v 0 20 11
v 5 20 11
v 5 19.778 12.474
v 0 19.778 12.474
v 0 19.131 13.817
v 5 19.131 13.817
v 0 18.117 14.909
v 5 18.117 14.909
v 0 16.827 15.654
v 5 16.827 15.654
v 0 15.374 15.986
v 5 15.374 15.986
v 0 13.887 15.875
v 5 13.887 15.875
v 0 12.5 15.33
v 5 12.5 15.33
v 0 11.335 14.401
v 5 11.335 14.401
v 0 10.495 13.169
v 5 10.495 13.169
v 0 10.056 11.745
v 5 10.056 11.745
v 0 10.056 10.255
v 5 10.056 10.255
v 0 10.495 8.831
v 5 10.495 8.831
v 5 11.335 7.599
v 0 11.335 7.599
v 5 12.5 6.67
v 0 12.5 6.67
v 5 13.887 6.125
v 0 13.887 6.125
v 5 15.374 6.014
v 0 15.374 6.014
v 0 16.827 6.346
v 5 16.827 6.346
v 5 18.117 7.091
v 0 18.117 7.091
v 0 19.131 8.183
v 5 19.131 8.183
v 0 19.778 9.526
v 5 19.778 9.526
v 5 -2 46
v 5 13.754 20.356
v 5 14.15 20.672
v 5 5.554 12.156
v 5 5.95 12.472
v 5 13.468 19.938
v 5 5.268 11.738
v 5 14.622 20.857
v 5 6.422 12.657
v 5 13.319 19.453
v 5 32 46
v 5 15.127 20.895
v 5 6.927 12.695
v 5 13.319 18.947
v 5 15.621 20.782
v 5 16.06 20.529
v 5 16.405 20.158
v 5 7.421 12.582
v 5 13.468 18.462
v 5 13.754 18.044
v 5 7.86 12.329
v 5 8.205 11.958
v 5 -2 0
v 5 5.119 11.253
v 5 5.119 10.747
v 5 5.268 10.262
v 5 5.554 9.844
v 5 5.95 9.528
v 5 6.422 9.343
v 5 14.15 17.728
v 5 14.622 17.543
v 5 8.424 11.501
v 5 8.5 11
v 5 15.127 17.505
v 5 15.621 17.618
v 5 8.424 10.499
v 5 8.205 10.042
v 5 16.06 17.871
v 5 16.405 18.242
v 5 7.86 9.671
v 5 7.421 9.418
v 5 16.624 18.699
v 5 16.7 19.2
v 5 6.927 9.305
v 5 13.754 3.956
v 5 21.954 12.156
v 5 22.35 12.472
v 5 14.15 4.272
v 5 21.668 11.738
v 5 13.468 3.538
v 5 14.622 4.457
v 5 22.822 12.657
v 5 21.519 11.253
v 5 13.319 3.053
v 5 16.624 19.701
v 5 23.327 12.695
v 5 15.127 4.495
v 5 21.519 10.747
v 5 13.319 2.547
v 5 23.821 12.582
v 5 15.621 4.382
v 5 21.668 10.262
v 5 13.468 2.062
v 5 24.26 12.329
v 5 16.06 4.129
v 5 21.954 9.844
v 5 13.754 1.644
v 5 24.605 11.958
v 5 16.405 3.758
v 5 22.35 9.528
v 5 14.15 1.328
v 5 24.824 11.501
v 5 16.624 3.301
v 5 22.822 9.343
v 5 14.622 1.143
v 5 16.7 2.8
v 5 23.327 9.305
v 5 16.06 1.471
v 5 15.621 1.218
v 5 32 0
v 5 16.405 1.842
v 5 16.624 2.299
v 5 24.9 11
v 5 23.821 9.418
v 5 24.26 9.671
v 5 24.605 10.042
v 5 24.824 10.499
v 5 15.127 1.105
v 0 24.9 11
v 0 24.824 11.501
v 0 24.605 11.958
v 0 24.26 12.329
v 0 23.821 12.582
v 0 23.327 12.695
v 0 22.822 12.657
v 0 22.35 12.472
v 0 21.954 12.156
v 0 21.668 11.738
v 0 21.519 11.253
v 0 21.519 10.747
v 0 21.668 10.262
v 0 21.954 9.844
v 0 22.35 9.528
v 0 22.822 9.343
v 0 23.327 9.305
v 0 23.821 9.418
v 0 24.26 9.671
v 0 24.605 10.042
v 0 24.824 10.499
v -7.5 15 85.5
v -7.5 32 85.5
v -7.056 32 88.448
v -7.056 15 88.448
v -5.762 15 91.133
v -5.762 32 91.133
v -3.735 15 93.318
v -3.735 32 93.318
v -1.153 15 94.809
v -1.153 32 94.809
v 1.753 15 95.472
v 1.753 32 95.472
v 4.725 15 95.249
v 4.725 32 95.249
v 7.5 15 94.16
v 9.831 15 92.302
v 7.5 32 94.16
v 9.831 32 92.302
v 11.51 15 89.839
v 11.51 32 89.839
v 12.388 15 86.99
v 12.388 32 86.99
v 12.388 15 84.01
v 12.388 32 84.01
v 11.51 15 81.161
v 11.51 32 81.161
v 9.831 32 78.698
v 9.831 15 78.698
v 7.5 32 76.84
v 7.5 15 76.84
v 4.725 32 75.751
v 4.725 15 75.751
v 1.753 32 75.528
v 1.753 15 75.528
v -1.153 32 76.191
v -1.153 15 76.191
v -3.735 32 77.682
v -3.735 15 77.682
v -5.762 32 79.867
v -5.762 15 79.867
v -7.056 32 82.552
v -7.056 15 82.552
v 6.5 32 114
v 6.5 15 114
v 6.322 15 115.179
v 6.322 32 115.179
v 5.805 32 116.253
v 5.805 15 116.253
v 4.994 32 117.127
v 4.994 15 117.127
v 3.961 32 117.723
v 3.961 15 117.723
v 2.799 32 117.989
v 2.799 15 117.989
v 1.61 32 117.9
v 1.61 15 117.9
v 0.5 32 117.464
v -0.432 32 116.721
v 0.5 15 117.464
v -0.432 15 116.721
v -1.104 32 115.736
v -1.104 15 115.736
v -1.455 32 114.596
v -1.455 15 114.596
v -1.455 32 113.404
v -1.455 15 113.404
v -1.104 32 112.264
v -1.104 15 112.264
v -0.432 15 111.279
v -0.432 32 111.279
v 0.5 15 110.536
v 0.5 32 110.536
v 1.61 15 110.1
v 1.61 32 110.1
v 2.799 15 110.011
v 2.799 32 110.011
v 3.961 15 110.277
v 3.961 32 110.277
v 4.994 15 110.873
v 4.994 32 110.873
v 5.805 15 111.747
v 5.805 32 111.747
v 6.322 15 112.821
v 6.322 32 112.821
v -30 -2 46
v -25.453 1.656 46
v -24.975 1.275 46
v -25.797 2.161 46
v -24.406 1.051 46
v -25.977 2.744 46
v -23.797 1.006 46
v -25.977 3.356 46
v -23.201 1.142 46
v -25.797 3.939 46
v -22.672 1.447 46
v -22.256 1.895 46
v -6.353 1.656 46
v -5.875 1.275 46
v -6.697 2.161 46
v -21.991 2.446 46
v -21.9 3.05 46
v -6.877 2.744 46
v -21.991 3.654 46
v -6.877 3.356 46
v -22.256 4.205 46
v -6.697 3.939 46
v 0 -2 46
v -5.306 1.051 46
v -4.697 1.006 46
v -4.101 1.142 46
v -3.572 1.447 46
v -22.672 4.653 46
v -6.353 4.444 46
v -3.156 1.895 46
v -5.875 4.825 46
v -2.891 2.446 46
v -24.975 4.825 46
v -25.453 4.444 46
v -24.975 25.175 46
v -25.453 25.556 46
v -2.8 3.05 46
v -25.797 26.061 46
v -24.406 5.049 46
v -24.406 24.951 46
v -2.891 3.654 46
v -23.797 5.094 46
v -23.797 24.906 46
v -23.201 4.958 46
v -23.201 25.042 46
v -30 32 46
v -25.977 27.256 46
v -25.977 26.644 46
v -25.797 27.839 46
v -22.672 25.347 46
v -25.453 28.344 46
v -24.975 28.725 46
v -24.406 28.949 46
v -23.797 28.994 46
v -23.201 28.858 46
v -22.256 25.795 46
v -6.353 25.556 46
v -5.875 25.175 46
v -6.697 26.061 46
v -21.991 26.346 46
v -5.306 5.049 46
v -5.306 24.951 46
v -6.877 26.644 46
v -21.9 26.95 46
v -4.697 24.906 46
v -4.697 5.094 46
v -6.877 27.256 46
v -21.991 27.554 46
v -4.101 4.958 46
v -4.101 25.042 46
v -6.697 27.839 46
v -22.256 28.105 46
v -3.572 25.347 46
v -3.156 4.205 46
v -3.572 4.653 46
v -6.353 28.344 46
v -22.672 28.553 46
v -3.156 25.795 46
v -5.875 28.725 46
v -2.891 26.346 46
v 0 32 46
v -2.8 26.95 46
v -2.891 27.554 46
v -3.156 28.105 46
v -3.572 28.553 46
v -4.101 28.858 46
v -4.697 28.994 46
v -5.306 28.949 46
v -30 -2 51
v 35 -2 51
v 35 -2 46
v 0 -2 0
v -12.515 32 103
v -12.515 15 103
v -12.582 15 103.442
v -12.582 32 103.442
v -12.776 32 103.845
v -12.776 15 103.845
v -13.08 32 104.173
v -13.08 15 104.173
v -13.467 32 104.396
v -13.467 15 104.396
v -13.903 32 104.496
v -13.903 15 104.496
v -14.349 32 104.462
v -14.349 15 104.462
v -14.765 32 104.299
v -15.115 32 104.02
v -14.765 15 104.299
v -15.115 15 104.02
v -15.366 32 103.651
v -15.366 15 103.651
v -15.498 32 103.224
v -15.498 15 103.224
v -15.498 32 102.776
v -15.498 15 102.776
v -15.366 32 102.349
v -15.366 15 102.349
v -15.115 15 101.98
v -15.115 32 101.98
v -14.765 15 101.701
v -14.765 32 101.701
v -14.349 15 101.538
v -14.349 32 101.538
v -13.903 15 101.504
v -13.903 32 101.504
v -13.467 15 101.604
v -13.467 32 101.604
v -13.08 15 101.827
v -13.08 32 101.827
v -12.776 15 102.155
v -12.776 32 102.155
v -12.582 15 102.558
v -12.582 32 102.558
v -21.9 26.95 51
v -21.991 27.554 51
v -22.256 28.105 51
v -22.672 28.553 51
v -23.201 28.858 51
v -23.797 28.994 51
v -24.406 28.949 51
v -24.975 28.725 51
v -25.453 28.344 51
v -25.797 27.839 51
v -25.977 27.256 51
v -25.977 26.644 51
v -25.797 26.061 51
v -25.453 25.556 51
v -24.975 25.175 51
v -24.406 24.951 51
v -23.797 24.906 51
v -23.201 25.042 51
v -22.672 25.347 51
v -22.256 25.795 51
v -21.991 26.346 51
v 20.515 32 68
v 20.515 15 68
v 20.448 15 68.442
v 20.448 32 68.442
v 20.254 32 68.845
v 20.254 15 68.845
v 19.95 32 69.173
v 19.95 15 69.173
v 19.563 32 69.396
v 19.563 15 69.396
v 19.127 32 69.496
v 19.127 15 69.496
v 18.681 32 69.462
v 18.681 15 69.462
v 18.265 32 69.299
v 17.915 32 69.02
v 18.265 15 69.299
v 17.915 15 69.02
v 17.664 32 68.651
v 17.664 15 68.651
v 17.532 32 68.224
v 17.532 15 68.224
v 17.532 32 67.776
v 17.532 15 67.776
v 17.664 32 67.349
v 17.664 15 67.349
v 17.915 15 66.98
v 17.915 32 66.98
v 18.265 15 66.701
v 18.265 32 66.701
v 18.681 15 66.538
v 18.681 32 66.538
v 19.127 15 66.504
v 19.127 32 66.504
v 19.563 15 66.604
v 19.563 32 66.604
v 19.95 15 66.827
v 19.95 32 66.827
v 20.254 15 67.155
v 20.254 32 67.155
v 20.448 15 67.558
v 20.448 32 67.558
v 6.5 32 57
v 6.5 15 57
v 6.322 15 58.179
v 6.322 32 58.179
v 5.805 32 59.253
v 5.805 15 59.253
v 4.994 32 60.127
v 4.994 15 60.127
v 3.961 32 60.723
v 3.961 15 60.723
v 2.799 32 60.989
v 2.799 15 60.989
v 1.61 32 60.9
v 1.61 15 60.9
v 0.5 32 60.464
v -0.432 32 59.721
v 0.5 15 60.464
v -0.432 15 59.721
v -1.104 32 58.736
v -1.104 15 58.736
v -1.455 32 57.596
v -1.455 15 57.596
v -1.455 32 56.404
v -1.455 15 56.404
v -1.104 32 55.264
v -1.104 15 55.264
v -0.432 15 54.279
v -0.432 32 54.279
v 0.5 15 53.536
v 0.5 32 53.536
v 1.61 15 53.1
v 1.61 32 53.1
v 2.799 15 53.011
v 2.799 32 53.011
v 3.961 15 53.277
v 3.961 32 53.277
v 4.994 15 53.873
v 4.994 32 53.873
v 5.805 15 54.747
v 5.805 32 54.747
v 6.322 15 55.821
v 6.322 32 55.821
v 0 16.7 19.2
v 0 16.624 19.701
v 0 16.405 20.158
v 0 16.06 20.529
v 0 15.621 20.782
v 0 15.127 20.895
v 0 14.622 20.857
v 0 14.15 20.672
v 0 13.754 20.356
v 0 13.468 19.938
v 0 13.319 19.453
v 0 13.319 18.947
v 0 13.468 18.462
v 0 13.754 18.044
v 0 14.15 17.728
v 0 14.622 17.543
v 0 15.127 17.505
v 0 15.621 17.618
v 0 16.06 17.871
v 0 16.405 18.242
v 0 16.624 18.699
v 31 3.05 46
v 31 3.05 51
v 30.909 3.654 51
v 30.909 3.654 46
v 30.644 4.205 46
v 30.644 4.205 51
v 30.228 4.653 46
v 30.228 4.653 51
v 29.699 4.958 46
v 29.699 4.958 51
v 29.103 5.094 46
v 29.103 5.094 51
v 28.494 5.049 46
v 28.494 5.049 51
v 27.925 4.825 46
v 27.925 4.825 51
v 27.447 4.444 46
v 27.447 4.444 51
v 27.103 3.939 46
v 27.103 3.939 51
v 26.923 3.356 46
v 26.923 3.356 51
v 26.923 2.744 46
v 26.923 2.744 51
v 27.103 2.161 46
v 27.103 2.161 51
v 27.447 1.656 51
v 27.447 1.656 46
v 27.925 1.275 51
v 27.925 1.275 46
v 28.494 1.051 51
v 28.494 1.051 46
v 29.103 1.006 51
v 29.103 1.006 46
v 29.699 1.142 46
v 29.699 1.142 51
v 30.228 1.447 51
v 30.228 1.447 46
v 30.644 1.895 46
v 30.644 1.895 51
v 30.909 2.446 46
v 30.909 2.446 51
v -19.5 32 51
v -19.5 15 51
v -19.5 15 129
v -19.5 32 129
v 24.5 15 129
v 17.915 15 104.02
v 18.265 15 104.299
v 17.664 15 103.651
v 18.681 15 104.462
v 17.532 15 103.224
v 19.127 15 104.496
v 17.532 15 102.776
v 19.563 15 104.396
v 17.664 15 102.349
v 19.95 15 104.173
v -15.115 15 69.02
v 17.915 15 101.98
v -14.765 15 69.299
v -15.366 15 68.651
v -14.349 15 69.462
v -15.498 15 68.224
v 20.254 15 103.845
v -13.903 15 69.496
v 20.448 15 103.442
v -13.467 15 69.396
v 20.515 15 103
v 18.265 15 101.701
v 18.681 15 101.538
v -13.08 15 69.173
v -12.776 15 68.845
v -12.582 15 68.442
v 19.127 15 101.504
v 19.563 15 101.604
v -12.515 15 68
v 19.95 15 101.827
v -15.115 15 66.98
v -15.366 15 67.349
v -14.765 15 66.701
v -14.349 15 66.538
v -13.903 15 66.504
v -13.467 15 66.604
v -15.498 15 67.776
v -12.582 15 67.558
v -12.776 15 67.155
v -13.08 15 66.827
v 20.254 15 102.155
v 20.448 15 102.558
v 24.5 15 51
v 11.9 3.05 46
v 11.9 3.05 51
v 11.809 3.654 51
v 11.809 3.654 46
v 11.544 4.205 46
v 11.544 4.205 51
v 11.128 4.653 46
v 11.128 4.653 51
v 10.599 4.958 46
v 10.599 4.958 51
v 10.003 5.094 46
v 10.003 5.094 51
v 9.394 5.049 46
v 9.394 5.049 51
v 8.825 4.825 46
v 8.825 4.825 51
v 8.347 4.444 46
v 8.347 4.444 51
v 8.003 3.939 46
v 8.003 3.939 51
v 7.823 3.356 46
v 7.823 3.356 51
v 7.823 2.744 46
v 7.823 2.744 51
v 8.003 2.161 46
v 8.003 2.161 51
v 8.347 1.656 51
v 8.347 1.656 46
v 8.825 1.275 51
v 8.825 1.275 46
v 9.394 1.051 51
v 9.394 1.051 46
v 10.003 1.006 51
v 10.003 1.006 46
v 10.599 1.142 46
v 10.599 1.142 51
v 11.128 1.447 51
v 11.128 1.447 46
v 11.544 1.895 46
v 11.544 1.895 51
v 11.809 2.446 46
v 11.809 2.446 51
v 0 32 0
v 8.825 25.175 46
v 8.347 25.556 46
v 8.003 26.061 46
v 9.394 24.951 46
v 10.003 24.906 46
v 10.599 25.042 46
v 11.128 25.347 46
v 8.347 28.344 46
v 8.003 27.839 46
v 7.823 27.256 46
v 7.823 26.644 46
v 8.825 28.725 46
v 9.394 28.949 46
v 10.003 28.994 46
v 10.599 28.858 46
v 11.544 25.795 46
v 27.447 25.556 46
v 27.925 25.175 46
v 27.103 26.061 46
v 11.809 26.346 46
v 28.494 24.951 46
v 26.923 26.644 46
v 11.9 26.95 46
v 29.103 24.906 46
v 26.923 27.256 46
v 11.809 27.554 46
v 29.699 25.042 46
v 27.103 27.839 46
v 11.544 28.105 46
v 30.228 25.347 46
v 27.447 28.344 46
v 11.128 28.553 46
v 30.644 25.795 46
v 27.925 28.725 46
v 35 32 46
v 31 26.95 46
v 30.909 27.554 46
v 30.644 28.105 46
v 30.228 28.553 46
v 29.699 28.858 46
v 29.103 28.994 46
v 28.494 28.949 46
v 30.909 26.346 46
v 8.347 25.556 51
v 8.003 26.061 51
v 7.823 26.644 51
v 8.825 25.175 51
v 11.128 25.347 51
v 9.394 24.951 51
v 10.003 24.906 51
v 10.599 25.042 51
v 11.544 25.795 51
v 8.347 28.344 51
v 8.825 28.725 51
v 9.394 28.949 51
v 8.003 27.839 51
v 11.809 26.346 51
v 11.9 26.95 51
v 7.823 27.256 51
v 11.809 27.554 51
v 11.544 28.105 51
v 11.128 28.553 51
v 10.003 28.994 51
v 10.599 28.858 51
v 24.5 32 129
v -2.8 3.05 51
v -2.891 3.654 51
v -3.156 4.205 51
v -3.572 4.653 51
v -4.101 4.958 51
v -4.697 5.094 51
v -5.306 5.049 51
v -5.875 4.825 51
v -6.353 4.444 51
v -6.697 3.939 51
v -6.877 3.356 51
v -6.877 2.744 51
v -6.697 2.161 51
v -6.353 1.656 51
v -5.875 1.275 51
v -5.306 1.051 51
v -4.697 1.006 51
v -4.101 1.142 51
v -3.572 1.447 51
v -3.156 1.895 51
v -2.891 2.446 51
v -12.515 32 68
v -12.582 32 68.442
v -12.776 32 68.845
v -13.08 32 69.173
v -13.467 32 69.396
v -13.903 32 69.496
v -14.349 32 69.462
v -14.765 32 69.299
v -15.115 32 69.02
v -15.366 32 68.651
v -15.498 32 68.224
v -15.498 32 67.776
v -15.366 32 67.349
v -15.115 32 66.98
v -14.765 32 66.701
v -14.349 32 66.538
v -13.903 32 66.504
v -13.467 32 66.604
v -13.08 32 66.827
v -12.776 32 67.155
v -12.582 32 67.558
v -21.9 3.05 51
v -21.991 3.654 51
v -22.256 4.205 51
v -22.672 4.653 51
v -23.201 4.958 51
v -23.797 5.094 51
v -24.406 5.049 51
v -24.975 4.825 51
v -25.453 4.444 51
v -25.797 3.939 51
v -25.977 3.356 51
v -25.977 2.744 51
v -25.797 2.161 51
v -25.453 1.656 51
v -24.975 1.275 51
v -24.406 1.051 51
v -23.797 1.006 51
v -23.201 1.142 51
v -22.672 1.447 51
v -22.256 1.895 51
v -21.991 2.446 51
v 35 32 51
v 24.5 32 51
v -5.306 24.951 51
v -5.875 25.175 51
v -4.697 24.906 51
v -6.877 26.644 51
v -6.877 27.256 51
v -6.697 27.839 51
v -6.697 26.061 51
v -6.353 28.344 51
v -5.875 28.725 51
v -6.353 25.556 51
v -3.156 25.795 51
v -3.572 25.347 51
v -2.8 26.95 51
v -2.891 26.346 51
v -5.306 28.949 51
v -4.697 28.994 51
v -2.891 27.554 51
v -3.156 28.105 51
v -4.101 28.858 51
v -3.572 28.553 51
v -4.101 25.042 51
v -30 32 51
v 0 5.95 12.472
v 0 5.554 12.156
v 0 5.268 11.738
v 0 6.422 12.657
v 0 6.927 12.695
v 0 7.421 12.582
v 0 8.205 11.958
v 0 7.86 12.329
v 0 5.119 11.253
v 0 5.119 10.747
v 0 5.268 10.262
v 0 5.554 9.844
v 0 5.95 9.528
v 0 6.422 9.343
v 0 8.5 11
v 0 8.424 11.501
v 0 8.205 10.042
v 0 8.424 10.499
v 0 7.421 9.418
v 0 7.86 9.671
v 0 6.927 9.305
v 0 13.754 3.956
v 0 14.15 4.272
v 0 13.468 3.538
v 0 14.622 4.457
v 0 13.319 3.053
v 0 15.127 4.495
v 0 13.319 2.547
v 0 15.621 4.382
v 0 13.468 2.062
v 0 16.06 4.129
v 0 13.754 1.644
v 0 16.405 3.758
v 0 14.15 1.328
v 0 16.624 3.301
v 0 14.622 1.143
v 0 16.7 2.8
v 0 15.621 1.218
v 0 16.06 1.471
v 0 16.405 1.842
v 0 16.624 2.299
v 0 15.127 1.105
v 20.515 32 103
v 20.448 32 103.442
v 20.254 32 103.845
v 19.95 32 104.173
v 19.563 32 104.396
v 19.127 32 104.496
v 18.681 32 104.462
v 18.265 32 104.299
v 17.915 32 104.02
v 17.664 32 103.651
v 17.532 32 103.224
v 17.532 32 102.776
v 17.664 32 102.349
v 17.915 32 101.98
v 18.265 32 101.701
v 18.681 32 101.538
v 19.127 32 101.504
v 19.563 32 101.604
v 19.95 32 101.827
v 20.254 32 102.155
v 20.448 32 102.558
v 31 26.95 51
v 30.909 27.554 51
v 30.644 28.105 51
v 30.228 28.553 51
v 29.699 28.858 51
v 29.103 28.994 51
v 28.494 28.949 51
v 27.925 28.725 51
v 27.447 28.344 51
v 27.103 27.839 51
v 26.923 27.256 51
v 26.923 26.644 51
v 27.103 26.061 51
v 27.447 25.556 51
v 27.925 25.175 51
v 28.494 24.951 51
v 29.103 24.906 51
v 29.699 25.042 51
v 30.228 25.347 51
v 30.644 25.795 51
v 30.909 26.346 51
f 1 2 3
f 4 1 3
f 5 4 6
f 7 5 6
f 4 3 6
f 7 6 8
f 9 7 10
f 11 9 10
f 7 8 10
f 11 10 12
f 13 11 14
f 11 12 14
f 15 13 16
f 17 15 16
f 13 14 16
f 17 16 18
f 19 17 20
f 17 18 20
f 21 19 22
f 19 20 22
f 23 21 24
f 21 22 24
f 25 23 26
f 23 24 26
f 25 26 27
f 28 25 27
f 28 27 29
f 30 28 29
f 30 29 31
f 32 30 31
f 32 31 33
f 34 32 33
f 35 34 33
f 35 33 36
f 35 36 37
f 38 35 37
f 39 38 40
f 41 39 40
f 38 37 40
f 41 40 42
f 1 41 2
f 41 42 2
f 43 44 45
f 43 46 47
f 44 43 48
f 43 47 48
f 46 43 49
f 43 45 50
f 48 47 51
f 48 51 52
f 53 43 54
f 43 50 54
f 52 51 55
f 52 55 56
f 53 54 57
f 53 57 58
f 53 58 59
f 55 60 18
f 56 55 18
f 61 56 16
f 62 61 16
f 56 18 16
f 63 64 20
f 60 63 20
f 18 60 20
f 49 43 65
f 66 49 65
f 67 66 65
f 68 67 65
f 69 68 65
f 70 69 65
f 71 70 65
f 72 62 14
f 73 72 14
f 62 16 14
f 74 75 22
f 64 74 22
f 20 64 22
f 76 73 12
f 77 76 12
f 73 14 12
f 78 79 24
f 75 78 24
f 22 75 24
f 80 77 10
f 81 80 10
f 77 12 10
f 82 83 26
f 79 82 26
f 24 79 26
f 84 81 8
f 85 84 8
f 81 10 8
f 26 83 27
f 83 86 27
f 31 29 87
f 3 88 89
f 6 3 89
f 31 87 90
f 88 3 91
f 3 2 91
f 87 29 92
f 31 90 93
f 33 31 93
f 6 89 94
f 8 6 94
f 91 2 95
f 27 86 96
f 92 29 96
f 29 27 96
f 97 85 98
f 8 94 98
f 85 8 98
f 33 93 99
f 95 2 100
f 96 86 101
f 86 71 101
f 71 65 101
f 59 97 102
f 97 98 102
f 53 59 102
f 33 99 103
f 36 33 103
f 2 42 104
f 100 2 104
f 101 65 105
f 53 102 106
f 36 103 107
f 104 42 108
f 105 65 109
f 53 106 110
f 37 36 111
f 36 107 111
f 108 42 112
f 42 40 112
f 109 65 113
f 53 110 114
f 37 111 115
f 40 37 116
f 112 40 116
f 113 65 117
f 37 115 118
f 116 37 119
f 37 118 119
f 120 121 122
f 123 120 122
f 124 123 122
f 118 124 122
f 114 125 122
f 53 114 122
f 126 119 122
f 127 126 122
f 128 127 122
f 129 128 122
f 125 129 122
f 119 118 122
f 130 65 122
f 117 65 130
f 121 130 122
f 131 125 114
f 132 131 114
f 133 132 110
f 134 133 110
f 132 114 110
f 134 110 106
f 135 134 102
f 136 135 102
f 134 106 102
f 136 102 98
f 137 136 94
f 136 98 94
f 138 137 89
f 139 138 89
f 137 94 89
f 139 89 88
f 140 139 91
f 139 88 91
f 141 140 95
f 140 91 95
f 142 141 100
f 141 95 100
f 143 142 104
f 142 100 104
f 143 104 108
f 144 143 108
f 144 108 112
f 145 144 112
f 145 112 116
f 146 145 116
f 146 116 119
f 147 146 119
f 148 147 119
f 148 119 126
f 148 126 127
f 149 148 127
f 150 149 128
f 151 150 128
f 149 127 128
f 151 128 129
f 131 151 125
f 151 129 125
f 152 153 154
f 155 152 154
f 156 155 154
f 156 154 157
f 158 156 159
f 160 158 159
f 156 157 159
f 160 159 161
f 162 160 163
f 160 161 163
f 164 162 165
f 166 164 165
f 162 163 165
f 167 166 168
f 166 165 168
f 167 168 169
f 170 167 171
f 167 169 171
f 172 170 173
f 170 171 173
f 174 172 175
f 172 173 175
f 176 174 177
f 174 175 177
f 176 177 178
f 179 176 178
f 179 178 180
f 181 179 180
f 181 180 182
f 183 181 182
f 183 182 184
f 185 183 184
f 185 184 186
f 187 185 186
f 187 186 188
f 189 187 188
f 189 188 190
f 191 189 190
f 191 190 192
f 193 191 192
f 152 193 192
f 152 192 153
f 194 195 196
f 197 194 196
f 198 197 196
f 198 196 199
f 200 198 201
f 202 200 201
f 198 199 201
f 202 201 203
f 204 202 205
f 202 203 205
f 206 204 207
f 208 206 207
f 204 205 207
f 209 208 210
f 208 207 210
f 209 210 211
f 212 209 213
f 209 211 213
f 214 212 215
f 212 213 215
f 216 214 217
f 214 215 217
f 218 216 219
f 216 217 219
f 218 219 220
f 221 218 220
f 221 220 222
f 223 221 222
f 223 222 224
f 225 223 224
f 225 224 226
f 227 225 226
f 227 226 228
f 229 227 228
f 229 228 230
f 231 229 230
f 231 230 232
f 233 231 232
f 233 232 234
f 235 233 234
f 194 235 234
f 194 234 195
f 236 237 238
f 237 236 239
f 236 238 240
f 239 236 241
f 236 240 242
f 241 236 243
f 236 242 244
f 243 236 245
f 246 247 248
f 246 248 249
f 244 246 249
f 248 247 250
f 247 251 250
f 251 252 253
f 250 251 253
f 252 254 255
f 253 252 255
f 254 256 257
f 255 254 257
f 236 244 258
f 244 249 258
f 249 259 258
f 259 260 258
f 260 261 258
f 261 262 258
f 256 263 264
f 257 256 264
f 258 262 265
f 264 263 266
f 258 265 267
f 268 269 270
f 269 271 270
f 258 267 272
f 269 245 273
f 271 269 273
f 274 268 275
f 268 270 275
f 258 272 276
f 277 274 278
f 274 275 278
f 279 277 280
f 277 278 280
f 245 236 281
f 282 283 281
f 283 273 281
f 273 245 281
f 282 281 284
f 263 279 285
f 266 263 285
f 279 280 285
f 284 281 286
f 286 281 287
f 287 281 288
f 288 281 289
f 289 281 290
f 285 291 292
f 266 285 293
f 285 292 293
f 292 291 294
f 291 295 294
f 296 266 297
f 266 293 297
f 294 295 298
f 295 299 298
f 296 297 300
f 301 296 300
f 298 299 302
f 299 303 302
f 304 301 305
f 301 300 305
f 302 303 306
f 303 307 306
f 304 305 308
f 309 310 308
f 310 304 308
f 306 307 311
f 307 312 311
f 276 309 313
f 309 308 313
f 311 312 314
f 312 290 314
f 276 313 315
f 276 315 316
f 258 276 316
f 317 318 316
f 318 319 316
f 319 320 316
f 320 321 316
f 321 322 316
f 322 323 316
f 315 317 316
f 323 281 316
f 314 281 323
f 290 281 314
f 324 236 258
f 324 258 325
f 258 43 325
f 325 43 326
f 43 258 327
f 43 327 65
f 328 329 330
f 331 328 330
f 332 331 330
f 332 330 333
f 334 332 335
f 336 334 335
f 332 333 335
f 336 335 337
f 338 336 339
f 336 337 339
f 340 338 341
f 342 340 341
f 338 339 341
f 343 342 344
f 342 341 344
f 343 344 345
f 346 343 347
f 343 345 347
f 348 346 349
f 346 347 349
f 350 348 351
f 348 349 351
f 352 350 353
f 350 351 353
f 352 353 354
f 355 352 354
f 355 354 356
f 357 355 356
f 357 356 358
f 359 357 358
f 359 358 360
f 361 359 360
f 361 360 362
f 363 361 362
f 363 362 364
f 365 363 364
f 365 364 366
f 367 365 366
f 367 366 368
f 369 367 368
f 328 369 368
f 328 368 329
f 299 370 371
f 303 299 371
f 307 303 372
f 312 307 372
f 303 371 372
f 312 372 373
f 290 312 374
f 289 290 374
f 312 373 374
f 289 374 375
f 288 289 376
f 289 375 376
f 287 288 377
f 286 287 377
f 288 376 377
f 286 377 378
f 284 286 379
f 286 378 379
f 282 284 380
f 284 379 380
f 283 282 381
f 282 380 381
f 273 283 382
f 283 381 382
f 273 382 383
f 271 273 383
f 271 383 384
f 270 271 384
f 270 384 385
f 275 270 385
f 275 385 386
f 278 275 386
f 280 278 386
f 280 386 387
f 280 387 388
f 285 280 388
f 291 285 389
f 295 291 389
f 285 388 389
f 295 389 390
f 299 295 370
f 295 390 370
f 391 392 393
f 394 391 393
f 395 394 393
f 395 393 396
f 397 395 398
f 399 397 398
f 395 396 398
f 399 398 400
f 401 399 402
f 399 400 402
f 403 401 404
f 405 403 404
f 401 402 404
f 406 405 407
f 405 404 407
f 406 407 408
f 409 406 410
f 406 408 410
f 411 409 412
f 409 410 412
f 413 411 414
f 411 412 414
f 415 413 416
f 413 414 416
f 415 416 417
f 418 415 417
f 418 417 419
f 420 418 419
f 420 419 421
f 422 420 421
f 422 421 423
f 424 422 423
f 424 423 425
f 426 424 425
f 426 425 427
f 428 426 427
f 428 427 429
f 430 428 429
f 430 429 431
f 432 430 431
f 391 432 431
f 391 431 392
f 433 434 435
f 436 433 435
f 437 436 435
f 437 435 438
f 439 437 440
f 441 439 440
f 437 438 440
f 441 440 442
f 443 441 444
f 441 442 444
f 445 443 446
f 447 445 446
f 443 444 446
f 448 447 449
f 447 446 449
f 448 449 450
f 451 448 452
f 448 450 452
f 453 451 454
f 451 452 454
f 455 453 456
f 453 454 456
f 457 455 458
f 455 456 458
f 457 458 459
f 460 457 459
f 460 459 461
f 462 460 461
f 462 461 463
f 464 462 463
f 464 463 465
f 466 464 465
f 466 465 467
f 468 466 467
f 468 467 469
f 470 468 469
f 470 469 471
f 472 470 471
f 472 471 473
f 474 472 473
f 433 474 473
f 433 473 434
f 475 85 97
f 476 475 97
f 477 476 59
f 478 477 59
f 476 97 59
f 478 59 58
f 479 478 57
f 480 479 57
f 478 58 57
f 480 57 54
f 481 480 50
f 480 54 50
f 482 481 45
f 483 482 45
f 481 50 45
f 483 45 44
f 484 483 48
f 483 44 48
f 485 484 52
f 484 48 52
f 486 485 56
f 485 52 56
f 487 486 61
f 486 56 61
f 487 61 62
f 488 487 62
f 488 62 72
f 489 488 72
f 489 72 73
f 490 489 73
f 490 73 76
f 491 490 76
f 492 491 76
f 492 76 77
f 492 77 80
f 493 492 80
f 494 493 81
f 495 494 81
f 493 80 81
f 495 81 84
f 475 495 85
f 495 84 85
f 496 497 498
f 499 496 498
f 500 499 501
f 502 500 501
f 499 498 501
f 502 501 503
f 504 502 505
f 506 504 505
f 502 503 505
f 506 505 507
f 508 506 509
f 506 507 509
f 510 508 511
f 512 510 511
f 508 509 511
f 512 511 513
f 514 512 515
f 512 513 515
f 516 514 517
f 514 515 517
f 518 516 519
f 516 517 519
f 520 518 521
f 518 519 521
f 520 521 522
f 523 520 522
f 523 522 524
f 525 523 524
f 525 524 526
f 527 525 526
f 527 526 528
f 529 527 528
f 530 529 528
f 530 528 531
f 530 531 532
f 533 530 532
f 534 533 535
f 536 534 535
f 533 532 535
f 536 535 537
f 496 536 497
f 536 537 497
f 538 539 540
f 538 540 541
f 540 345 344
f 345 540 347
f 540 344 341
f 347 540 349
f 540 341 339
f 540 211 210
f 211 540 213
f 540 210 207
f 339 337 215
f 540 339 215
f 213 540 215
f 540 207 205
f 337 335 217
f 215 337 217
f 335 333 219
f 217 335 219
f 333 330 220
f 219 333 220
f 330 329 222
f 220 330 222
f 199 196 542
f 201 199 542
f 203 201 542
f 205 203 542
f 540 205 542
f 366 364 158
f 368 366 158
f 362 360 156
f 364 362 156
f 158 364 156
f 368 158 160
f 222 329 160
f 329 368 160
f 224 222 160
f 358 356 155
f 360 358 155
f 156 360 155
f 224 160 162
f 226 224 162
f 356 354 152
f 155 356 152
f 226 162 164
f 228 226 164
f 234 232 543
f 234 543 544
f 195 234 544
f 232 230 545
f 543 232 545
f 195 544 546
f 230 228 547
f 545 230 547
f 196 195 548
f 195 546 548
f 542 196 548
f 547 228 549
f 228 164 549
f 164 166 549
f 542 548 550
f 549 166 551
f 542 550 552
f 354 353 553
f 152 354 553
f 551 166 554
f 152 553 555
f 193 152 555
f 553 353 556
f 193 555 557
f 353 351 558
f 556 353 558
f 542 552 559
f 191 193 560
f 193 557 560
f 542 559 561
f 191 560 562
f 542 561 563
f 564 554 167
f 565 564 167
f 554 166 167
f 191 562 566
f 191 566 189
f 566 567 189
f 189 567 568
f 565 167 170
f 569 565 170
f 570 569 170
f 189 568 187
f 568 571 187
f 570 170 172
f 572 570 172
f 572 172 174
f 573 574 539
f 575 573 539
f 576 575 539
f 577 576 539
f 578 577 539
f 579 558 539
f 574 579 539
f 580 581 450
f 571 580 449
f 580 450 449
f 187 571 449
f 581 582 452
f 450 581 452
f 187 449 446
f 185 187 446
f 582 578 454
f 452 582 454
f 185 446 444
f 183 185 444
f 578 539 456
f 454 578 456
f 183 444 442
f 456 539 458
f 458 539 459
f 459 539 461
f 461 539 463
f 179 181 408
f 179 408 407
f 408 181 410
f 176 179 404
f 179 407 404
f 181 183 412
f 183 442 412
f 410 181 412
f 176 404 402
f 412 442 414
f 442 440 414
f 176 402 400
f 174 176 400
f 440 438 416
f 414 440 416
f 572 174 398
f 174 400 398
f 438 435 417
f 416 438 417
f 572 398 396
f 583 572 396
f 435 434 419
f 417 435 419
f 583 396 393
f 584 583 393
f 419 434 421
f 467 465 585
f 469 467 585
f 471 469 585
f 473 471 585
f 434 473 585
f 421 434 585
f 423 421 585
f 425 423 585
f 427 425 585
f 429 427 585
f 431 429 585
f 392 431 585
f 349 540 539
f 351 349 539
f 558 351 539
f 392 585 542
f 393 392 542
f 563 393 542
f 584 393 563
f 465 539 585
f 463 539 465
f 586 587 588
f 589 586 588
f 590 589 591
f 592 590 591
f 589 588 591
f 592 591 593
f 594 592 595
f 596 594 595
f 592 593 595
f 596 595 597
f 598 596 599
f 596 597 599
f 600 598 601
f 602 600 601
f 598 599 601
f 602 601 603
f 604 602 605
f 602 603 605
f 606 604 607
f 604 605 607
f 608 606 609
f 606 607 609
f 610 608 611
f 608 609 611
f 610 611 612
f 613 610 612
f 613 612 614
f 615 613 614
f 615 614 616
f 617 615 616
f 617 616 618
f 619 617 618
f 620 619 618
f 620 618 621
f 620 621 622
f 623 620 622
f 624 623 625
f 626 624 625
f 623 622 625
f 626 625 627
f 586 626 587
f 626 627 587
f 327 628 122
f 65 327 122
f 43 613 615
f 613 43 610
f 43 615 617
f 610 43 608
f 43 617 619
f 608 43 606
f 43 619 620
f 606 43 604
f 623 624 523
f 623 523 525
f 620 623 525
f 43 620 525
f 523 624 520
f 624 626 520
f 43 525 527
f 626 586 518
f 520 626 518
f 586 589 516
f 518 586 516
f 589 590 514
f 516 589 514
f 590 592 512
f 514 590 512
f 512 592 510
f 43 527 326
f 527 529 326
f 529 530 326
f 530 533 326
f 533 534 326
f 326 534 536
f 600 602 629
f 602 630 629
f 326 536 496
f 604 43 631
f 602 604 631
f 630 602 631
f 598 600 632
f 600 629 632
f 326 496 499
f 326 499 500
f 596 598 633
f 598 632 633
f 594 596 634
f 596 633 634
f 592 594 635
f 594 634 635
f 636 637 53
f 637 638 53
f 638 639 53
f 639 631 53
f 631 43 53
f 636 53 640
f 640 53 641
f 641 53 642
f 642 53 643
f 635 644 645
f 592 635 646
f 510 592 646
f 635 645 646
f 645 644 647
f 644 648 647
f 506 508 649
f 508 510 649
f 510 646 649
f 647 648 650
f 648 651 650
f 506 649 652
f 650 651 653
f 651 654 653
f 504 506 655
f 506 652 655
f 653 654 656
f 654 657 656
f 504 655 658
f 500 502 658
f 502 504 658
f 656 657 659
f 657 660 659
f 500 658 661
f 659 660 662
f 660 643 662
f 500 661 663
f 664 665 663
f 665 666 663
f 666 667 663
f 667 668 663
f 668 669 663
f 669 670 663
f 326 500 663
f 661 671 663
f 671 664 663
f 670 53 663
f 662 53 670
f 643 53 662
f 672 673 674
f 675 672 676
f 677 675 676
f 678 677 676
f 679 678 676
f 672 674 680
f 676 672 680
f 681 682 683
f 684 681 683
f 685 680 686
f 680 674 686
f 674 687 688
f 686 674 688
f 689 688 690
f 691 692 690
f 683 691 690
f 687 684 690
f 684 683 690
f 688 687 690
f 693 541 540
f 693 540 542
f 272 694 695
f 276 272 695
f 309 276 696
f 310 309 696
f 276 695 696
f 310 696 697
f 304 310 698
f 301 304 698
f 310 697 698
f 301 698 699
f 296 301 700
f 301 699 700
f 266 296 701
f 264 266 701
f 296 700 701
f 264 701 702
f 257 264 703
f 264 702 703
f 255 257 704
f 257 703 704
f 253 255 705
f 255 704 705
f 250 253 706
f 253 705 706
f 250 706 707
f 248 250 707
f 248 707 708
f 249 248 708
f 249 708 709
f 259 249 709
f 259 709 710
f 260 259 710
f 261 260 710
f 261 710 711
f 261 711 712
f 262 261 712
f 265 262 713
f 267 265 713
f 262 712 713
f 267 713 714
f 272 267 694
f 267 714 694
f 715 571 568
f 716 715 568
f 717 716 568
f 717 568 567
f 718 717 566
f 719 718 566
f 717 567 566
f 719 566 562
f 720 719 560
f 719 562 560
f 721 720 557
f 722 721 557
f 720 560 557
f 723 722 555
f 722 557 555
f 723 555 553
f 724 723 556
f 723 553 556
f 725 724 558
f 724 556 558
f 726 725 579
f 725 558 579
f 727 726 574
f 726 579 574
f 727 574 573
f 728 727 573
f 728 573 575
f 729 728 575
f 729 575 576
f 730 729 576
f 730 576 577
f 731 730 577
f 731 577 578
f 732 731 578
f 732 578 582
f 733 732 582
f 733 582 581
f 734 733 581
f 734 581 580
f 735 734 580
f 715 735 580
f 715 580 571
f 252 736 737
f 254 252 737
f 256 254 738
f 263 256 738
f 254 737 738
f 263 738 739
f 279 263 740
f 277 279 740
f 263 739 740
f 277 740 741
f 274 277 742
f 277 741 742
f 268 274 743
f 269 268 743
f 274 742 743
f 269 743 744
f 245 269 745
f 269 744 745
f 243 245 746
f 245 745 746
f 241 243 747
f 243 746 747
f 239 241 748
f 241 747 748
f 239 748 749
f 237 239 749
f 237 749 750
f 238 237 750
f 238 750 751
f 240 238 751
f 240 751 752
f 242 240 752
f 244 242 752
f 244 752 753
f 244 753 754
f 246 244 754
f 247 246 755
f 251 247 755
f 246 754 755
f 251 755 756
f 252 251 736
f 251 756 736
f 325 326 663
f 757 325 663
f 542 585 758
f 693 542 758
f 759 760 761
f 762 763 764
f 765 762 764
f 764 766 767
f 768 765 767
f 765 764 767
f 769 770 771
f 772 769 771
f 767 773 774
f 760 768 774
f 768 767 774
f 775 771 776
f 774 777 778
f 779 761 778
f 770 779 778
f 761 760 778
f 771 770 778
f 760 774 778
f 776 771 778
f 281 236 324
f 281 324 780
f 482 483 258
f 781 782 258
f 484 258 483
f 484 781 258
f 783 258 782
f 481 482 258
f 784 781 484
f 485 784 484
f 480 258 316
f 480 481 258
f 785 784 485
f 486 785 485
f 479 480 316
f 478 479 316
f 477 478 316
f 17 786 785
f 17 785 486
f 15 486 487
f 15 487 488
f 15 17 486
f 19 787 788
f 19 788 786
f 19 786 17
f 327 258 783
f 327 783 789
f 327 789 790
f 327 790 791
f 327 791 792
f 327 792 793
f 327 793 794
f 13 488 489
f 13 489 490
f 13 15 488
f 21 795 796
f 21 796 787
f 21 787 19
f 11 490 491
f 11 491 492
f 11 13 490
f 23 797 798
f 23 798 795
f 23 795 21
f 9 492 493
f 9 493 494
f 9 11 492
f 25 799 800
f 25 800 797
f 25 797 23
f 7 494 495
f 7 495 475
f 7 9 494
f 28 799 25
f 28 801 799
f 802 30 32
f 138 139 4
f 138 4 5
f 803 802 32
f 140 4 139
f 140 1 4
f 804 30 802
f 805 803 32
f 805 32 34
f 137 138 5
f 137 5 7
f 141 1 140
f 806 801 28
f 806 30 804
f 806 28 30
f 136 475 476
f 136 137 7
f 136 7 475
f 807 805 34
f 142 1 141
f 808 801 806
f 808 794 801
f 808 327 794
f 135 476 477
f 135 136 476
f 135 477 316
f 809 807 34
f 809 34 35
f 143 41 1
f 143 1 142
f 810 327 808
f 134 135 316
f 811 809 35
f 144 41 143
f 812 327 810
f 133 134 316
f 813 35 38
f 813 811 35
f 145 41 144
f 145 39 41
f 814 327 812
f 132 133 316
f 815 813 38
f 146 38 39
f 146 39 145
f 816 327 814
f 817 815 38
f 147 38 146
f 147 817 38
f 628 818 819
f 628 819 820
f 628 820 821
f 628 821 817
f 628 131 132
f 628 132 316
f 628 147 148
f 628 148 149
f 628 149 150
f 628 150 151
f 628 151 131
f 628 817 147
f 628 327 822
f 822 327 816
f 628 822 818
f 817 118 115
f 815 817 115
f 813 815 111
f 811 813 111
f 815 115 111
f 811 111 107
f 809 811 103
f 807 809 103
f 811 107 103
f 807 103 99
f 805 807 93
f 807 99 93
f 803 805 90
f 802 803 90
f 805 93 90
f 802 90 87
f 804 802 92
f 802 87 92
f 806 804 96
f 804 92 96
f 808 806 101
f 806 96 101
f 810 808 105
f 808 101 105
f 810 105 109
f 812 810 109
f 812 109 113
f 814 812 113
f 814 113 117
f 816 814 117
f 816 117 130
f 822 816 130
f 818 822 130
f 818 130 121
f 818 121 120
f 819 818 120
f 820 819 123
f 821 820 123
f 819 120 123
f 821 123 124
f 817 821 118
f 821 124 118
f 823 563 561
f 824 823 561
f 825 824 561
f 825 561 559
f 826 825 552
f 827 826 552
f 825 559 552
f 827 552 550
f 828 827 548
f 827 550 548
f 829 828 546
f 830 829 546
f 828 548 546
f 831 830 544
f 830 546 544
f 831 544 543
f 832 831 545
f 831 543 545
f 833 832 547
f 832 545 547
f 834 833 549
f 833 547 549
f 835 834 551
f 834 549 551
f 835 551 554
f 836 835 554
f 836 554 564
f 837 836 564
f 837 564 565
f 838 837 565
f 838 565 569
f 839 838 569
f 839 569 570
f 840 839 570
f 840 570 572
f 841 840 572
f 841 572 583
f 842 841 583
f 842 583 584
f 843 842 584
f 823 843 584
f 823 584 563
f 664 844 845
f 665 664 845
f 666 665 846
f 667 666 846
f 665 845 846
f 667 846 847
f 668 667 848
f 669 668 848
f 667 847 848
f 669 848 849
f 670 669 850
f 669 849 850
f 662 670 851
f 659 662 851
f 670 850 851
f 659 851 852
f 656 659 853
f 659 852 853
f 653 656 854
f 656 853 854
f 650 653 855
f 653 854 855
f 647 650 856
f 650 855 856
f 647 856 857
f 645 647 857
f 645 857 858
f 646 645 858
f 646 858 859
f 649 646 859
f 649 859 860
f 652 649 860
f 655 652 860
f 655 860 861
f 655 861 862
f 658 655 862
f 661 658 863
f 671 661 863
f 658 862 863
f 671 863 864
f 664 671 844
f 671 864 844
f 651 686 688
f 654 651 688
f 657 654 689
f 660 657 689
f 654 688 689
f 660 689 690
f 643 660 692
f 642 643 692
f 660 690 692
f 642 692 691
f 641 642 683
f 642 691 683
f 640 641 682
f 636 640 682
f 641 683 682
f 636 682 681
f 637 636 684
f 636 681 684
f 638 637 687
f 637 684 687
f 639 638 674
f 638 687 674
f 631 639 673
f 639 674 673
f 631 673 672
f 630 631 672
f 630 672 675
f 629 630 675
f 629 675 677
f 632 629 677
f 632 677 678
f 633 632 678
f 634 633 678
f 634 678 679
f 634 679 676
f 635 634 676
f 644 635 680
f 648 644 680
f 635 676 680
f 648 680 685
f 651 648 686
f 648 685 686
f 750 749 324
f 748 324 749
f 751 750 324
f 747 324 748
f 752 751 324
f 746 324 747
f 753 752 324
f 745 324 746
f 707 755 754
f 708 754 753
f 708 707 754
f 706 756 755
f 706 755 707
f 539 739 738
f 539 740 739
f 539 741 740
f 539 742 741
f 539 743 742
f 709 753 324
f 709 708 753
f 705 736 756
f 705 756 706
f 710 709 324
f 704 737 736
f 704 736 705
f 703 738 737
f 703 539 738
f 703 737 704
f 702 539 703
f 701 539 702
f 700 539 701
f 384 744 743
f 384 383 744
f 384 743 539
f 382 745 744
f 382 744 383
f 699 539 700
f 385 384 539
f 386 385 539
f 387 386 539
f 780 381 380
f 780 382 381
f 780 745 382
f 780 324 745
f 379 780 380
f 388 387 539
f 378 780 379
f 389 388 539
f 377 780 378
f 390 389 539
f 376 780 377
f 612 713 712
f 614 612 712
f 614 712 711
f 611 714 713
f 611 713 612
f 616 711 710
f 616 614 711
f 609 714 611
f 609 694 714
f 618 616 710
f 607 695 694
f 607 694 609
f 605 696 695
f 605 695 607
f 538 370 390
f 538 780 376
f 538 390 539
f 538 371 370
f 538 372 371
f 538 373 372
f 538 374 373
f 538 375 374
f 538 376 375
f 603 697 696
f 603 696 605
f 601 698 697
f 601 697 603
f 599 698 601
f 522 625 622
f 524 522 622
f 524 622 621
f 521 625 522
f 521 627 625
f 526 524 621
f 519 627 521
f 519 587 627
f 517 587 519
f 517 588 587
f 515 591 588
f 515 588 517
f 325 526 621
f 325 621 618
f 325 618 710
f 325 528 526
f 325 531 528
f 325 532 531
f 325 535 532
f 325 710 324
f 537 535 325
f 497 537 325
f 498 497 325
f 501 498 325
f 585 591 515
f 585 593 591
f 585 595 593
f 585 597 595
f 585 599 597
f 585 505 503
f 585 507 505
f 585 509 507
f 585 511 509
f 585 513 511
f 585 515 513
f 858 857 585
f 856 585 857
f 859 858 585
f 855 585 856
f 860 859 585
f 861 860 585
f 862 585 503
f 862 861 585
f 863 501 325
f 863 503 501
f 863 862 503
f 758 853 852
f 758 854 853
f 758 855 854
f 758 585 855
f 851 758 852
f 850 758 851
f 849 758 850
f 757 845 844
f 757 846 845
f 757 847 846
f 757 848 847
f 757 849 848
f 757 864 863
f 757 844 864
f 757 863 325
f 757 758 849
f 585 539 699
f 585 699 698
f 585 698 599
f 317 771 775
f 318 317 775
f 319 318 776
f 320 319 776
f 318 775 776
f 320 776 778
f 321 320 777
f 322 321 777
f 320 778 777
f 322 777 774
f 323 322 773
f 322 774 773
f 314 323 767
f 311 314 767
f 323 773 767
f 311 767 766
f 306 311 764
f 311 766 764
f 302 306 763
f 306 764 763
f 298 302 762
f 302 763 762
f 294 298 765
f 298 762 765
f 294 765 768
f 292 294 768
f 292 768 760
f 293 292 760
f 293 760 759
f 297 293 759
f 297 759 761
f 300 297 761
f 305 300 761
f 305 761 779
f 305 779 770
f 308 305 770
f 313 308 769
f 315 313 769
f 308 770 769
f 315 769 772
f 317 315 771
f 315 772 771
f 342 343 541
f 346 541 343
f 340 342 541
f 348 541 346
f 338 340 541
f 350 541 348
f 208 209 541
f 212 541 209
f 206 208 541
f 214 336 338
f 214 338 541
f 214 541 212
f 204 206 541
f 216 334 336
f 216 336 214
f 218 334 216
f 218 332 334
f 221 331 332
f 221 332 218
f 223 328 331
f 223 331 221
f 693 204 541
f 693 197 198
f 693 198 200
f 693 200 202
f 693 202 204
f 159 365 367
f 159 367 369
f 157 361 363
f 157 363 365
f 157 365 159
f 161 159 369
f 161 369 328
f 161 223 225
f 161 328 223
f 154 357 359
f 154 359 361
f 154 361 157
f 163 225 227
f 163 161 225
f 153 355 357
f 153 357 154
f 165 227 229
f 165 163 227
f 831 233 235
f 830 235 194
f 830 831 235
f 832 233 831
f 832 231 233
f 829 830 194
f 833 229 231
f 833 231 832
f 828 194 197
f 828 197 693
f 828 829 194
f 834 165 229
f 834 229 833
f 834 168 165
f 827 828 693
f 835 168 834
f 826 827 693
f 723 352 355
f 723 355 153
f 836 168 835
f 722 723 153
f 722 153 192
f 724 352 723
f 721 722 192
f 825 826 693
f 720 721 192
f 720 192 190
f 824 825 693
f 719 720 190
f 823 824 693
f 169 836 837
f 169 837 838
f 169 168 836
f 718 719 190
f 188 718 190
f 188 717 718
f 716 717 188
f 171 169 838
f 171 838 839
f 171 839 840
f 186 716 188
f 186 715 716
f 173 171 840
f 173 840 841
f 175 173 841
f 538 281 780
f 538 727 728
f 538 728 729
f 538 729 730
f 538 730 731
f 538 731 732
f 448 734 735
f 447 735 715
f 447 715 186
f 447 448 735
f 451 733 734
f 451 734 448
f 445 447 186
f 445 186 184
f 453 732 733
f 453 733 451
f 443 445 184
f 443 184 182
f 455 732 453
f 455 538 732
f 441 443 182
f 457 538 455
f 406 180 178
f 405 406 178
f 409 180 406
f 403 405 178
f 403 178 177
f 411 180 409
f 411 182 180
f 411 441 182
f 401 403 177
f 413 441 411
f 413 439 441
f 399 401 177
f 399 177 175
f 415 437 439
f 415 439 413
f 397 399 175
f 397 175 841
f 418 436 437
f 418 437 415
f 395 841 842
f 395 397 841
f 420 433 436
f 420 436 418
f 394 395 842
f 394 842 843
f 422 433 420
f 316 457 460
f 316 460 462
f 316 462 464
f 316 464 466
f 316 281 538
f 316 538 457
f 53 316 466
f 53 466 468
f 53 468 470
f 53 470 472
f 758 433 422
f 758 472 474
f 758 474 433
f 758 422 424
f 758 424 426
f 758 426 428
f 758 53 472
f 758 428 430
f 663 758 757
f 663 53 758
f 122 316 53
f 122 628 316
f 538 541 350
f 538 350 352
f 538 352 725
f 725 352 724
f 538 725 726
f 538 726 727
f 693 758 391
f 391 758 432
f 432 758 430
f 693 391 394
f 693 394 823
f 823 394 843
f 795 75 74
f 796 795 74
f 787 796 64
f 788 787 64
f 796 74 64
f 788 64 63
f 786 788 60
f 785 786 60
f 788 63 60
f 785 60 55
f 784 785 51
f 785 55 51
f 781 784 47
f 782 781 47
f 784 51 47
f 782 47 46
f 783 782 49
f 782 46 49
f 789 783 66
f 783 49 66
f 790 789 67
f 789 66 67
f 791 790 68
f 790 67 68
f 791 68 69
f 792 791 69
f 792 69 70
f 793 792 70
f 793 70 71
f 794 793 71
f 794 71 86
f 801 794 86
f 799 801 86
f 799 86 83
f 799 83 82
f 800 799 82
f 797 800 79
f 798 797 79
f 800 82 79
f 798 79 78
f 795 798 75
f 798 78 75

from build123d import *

# Parameters (mm, degrees)
BOX001_W        = 65
BOX001_H        = 34
BOX001_DEPTH    = 5
BOX_W           = 5
BOX_H           = 34
BOX_DEPTH       = 46
SKETCH_R        = 2.05
POCKET_DEPTH    = 5
SKETCH001_R     = 5
SKETCH001_R_2   = 1.7
POCKET001_DEPTH = 5
BOX002_W        = 44
BOX002_H        = 17
BOX002_DEPTH    = 78
SKETCH003_R     = 4
SKETCH003_R_2   = 1.5
POCKET003_DEPTH = 17.001
SKETCH008_R     = 10
POCKET006_DEPTH = 34.001


with BuildPart() as cubo001:
    # Box001 → Box001 (new body)
    with BuildSketch(Plane(origin=(-30, -2, 46), x_dir=(1, 0, 0), z_dir=(0, 0, 1))):
        with Locations((32.5, 17)):
            Rectangle(BOX001_W, BOX001_H)
    extrude(amount=BOX001_DEPTH)


with BuildPart() as pocket001:
    # Box → Box (new body)
    with BuildSketch(Plane(origin=(0, -2, 0), x_dir=(1, 0, 0), z_dir=(0, 0, 1))):
        with Locations((2.5, 17)):
            Rectangle(BOX_W, BOX_H)
    extrude(amount=BOX_DEPTH)

    # Fusion: union Cubo001
    add(cubo001.part)

    # Sketch → Pocket (cut)
    with BuildSketch(Plane.XY.offset(51)):
        with Locations((-36.05, -7.05)):
            Circle(SKETCH_R)
        with Locations((28.95, 3.05)):
            Circle(SKETCH_R)
        with Locations((-55.15, -7.05)):
            Circle(SKETCH_R)
        with Locations((9.85, 3.05)):
            Circle(SKETCH_R)
        with Locations((-4.85, 3.05)):
            Circle(SKETCH_R)
        with Locations((-23.95, 3.05)):
            Circle(SKETCH_R)
        with Locations((-23.95, 26.95)):
            Circle(SKETCH_R)
        with Locations((-4.85, 26.95)):
            Circle(SKETCH_R)
        with Locations((9.85, 26.95)):
            Circle(SKETCH_R)
        with Locations((28.95, 26.95)):
            Circle(SKETCH_R)
    extrude(amount=-POCKET_DEPTH, mode=Mode.SUBTRACT)

    # Sketch001 → Pocket001 (cut)
    with BuildSketch(Plane.YZ.offset(5)):
        with Locations((15, 11)):
            Circle(SKETCH001_R)
        with Locations((15, 19.2)):
            Circle(SKETCH001_R_2)
        with Locations((23.2, 11)):
            Circle(SKETCH001_R_2)
        with Locations((15, 2.8)):
            Circle(SKETCH001_R_2)
        with Locations((6.8, 11)):
            Circle(SKETCH001_R_2)
    extrude(amount=-POCKET001_DEPTH, mode=Mode.SUBTRACT)


with BuildPart() as pocket006:
    # Box002 → Box002 (new body)
    with BuildSketch(Plane(origin=(-19.5, 15, 51), x_dir=(1, 0, 0), z_dir=(0, 0, 1))):
        with Locations((22, 8.5)):
            Rectangle(BOX002_W, BOX002_H)
    extrude(amount=BOX002_DEPTH)

    # Sketch003 → Pocket003 (cut, through all)
    with BuildSketch(Plane(origin=(-19.5, 15, 51), x_dir=(1, 0, 0), z_dir=(0, -1, 0))):
        with Locations((22, 6)):
            Circle(SKETCH003_R)
        with Locations((22, 63)):
            Circle(SKETCH003_R)
        with Locations((5.485017, 17)):
            Circle(SKETCH003_R_2)
        with Locations((38.514983, 17)):
            Circle(SKETCH003_R_2)
        with Locations((5.485017, 52)):
            Circle(SKETCH003_R_2)
        with Locations((38.514983, 52)):
            Circle(SKETCH003_R_2)
    extrude(amount=-POCKET003_DEPTH, mode=Mode.SUBTRACT)

    # Fusion001003: union Pocket001
    add(pocket001.part)

    # Sketch008 → Pocket006 (cut, through all)
    with BuildSketch(Plane(origin=(0, 32, 0), x_dir=(-1, 0, 0), z_dir=(0, 1, 0))):
        with Locations((-2.500008, 85.500008)):
            Circle(SKETCH008_R)
    extrude(amount=-POCKET006_DEPTH, mode=Mode.SUBTRACT)


solid = pocket006.part
